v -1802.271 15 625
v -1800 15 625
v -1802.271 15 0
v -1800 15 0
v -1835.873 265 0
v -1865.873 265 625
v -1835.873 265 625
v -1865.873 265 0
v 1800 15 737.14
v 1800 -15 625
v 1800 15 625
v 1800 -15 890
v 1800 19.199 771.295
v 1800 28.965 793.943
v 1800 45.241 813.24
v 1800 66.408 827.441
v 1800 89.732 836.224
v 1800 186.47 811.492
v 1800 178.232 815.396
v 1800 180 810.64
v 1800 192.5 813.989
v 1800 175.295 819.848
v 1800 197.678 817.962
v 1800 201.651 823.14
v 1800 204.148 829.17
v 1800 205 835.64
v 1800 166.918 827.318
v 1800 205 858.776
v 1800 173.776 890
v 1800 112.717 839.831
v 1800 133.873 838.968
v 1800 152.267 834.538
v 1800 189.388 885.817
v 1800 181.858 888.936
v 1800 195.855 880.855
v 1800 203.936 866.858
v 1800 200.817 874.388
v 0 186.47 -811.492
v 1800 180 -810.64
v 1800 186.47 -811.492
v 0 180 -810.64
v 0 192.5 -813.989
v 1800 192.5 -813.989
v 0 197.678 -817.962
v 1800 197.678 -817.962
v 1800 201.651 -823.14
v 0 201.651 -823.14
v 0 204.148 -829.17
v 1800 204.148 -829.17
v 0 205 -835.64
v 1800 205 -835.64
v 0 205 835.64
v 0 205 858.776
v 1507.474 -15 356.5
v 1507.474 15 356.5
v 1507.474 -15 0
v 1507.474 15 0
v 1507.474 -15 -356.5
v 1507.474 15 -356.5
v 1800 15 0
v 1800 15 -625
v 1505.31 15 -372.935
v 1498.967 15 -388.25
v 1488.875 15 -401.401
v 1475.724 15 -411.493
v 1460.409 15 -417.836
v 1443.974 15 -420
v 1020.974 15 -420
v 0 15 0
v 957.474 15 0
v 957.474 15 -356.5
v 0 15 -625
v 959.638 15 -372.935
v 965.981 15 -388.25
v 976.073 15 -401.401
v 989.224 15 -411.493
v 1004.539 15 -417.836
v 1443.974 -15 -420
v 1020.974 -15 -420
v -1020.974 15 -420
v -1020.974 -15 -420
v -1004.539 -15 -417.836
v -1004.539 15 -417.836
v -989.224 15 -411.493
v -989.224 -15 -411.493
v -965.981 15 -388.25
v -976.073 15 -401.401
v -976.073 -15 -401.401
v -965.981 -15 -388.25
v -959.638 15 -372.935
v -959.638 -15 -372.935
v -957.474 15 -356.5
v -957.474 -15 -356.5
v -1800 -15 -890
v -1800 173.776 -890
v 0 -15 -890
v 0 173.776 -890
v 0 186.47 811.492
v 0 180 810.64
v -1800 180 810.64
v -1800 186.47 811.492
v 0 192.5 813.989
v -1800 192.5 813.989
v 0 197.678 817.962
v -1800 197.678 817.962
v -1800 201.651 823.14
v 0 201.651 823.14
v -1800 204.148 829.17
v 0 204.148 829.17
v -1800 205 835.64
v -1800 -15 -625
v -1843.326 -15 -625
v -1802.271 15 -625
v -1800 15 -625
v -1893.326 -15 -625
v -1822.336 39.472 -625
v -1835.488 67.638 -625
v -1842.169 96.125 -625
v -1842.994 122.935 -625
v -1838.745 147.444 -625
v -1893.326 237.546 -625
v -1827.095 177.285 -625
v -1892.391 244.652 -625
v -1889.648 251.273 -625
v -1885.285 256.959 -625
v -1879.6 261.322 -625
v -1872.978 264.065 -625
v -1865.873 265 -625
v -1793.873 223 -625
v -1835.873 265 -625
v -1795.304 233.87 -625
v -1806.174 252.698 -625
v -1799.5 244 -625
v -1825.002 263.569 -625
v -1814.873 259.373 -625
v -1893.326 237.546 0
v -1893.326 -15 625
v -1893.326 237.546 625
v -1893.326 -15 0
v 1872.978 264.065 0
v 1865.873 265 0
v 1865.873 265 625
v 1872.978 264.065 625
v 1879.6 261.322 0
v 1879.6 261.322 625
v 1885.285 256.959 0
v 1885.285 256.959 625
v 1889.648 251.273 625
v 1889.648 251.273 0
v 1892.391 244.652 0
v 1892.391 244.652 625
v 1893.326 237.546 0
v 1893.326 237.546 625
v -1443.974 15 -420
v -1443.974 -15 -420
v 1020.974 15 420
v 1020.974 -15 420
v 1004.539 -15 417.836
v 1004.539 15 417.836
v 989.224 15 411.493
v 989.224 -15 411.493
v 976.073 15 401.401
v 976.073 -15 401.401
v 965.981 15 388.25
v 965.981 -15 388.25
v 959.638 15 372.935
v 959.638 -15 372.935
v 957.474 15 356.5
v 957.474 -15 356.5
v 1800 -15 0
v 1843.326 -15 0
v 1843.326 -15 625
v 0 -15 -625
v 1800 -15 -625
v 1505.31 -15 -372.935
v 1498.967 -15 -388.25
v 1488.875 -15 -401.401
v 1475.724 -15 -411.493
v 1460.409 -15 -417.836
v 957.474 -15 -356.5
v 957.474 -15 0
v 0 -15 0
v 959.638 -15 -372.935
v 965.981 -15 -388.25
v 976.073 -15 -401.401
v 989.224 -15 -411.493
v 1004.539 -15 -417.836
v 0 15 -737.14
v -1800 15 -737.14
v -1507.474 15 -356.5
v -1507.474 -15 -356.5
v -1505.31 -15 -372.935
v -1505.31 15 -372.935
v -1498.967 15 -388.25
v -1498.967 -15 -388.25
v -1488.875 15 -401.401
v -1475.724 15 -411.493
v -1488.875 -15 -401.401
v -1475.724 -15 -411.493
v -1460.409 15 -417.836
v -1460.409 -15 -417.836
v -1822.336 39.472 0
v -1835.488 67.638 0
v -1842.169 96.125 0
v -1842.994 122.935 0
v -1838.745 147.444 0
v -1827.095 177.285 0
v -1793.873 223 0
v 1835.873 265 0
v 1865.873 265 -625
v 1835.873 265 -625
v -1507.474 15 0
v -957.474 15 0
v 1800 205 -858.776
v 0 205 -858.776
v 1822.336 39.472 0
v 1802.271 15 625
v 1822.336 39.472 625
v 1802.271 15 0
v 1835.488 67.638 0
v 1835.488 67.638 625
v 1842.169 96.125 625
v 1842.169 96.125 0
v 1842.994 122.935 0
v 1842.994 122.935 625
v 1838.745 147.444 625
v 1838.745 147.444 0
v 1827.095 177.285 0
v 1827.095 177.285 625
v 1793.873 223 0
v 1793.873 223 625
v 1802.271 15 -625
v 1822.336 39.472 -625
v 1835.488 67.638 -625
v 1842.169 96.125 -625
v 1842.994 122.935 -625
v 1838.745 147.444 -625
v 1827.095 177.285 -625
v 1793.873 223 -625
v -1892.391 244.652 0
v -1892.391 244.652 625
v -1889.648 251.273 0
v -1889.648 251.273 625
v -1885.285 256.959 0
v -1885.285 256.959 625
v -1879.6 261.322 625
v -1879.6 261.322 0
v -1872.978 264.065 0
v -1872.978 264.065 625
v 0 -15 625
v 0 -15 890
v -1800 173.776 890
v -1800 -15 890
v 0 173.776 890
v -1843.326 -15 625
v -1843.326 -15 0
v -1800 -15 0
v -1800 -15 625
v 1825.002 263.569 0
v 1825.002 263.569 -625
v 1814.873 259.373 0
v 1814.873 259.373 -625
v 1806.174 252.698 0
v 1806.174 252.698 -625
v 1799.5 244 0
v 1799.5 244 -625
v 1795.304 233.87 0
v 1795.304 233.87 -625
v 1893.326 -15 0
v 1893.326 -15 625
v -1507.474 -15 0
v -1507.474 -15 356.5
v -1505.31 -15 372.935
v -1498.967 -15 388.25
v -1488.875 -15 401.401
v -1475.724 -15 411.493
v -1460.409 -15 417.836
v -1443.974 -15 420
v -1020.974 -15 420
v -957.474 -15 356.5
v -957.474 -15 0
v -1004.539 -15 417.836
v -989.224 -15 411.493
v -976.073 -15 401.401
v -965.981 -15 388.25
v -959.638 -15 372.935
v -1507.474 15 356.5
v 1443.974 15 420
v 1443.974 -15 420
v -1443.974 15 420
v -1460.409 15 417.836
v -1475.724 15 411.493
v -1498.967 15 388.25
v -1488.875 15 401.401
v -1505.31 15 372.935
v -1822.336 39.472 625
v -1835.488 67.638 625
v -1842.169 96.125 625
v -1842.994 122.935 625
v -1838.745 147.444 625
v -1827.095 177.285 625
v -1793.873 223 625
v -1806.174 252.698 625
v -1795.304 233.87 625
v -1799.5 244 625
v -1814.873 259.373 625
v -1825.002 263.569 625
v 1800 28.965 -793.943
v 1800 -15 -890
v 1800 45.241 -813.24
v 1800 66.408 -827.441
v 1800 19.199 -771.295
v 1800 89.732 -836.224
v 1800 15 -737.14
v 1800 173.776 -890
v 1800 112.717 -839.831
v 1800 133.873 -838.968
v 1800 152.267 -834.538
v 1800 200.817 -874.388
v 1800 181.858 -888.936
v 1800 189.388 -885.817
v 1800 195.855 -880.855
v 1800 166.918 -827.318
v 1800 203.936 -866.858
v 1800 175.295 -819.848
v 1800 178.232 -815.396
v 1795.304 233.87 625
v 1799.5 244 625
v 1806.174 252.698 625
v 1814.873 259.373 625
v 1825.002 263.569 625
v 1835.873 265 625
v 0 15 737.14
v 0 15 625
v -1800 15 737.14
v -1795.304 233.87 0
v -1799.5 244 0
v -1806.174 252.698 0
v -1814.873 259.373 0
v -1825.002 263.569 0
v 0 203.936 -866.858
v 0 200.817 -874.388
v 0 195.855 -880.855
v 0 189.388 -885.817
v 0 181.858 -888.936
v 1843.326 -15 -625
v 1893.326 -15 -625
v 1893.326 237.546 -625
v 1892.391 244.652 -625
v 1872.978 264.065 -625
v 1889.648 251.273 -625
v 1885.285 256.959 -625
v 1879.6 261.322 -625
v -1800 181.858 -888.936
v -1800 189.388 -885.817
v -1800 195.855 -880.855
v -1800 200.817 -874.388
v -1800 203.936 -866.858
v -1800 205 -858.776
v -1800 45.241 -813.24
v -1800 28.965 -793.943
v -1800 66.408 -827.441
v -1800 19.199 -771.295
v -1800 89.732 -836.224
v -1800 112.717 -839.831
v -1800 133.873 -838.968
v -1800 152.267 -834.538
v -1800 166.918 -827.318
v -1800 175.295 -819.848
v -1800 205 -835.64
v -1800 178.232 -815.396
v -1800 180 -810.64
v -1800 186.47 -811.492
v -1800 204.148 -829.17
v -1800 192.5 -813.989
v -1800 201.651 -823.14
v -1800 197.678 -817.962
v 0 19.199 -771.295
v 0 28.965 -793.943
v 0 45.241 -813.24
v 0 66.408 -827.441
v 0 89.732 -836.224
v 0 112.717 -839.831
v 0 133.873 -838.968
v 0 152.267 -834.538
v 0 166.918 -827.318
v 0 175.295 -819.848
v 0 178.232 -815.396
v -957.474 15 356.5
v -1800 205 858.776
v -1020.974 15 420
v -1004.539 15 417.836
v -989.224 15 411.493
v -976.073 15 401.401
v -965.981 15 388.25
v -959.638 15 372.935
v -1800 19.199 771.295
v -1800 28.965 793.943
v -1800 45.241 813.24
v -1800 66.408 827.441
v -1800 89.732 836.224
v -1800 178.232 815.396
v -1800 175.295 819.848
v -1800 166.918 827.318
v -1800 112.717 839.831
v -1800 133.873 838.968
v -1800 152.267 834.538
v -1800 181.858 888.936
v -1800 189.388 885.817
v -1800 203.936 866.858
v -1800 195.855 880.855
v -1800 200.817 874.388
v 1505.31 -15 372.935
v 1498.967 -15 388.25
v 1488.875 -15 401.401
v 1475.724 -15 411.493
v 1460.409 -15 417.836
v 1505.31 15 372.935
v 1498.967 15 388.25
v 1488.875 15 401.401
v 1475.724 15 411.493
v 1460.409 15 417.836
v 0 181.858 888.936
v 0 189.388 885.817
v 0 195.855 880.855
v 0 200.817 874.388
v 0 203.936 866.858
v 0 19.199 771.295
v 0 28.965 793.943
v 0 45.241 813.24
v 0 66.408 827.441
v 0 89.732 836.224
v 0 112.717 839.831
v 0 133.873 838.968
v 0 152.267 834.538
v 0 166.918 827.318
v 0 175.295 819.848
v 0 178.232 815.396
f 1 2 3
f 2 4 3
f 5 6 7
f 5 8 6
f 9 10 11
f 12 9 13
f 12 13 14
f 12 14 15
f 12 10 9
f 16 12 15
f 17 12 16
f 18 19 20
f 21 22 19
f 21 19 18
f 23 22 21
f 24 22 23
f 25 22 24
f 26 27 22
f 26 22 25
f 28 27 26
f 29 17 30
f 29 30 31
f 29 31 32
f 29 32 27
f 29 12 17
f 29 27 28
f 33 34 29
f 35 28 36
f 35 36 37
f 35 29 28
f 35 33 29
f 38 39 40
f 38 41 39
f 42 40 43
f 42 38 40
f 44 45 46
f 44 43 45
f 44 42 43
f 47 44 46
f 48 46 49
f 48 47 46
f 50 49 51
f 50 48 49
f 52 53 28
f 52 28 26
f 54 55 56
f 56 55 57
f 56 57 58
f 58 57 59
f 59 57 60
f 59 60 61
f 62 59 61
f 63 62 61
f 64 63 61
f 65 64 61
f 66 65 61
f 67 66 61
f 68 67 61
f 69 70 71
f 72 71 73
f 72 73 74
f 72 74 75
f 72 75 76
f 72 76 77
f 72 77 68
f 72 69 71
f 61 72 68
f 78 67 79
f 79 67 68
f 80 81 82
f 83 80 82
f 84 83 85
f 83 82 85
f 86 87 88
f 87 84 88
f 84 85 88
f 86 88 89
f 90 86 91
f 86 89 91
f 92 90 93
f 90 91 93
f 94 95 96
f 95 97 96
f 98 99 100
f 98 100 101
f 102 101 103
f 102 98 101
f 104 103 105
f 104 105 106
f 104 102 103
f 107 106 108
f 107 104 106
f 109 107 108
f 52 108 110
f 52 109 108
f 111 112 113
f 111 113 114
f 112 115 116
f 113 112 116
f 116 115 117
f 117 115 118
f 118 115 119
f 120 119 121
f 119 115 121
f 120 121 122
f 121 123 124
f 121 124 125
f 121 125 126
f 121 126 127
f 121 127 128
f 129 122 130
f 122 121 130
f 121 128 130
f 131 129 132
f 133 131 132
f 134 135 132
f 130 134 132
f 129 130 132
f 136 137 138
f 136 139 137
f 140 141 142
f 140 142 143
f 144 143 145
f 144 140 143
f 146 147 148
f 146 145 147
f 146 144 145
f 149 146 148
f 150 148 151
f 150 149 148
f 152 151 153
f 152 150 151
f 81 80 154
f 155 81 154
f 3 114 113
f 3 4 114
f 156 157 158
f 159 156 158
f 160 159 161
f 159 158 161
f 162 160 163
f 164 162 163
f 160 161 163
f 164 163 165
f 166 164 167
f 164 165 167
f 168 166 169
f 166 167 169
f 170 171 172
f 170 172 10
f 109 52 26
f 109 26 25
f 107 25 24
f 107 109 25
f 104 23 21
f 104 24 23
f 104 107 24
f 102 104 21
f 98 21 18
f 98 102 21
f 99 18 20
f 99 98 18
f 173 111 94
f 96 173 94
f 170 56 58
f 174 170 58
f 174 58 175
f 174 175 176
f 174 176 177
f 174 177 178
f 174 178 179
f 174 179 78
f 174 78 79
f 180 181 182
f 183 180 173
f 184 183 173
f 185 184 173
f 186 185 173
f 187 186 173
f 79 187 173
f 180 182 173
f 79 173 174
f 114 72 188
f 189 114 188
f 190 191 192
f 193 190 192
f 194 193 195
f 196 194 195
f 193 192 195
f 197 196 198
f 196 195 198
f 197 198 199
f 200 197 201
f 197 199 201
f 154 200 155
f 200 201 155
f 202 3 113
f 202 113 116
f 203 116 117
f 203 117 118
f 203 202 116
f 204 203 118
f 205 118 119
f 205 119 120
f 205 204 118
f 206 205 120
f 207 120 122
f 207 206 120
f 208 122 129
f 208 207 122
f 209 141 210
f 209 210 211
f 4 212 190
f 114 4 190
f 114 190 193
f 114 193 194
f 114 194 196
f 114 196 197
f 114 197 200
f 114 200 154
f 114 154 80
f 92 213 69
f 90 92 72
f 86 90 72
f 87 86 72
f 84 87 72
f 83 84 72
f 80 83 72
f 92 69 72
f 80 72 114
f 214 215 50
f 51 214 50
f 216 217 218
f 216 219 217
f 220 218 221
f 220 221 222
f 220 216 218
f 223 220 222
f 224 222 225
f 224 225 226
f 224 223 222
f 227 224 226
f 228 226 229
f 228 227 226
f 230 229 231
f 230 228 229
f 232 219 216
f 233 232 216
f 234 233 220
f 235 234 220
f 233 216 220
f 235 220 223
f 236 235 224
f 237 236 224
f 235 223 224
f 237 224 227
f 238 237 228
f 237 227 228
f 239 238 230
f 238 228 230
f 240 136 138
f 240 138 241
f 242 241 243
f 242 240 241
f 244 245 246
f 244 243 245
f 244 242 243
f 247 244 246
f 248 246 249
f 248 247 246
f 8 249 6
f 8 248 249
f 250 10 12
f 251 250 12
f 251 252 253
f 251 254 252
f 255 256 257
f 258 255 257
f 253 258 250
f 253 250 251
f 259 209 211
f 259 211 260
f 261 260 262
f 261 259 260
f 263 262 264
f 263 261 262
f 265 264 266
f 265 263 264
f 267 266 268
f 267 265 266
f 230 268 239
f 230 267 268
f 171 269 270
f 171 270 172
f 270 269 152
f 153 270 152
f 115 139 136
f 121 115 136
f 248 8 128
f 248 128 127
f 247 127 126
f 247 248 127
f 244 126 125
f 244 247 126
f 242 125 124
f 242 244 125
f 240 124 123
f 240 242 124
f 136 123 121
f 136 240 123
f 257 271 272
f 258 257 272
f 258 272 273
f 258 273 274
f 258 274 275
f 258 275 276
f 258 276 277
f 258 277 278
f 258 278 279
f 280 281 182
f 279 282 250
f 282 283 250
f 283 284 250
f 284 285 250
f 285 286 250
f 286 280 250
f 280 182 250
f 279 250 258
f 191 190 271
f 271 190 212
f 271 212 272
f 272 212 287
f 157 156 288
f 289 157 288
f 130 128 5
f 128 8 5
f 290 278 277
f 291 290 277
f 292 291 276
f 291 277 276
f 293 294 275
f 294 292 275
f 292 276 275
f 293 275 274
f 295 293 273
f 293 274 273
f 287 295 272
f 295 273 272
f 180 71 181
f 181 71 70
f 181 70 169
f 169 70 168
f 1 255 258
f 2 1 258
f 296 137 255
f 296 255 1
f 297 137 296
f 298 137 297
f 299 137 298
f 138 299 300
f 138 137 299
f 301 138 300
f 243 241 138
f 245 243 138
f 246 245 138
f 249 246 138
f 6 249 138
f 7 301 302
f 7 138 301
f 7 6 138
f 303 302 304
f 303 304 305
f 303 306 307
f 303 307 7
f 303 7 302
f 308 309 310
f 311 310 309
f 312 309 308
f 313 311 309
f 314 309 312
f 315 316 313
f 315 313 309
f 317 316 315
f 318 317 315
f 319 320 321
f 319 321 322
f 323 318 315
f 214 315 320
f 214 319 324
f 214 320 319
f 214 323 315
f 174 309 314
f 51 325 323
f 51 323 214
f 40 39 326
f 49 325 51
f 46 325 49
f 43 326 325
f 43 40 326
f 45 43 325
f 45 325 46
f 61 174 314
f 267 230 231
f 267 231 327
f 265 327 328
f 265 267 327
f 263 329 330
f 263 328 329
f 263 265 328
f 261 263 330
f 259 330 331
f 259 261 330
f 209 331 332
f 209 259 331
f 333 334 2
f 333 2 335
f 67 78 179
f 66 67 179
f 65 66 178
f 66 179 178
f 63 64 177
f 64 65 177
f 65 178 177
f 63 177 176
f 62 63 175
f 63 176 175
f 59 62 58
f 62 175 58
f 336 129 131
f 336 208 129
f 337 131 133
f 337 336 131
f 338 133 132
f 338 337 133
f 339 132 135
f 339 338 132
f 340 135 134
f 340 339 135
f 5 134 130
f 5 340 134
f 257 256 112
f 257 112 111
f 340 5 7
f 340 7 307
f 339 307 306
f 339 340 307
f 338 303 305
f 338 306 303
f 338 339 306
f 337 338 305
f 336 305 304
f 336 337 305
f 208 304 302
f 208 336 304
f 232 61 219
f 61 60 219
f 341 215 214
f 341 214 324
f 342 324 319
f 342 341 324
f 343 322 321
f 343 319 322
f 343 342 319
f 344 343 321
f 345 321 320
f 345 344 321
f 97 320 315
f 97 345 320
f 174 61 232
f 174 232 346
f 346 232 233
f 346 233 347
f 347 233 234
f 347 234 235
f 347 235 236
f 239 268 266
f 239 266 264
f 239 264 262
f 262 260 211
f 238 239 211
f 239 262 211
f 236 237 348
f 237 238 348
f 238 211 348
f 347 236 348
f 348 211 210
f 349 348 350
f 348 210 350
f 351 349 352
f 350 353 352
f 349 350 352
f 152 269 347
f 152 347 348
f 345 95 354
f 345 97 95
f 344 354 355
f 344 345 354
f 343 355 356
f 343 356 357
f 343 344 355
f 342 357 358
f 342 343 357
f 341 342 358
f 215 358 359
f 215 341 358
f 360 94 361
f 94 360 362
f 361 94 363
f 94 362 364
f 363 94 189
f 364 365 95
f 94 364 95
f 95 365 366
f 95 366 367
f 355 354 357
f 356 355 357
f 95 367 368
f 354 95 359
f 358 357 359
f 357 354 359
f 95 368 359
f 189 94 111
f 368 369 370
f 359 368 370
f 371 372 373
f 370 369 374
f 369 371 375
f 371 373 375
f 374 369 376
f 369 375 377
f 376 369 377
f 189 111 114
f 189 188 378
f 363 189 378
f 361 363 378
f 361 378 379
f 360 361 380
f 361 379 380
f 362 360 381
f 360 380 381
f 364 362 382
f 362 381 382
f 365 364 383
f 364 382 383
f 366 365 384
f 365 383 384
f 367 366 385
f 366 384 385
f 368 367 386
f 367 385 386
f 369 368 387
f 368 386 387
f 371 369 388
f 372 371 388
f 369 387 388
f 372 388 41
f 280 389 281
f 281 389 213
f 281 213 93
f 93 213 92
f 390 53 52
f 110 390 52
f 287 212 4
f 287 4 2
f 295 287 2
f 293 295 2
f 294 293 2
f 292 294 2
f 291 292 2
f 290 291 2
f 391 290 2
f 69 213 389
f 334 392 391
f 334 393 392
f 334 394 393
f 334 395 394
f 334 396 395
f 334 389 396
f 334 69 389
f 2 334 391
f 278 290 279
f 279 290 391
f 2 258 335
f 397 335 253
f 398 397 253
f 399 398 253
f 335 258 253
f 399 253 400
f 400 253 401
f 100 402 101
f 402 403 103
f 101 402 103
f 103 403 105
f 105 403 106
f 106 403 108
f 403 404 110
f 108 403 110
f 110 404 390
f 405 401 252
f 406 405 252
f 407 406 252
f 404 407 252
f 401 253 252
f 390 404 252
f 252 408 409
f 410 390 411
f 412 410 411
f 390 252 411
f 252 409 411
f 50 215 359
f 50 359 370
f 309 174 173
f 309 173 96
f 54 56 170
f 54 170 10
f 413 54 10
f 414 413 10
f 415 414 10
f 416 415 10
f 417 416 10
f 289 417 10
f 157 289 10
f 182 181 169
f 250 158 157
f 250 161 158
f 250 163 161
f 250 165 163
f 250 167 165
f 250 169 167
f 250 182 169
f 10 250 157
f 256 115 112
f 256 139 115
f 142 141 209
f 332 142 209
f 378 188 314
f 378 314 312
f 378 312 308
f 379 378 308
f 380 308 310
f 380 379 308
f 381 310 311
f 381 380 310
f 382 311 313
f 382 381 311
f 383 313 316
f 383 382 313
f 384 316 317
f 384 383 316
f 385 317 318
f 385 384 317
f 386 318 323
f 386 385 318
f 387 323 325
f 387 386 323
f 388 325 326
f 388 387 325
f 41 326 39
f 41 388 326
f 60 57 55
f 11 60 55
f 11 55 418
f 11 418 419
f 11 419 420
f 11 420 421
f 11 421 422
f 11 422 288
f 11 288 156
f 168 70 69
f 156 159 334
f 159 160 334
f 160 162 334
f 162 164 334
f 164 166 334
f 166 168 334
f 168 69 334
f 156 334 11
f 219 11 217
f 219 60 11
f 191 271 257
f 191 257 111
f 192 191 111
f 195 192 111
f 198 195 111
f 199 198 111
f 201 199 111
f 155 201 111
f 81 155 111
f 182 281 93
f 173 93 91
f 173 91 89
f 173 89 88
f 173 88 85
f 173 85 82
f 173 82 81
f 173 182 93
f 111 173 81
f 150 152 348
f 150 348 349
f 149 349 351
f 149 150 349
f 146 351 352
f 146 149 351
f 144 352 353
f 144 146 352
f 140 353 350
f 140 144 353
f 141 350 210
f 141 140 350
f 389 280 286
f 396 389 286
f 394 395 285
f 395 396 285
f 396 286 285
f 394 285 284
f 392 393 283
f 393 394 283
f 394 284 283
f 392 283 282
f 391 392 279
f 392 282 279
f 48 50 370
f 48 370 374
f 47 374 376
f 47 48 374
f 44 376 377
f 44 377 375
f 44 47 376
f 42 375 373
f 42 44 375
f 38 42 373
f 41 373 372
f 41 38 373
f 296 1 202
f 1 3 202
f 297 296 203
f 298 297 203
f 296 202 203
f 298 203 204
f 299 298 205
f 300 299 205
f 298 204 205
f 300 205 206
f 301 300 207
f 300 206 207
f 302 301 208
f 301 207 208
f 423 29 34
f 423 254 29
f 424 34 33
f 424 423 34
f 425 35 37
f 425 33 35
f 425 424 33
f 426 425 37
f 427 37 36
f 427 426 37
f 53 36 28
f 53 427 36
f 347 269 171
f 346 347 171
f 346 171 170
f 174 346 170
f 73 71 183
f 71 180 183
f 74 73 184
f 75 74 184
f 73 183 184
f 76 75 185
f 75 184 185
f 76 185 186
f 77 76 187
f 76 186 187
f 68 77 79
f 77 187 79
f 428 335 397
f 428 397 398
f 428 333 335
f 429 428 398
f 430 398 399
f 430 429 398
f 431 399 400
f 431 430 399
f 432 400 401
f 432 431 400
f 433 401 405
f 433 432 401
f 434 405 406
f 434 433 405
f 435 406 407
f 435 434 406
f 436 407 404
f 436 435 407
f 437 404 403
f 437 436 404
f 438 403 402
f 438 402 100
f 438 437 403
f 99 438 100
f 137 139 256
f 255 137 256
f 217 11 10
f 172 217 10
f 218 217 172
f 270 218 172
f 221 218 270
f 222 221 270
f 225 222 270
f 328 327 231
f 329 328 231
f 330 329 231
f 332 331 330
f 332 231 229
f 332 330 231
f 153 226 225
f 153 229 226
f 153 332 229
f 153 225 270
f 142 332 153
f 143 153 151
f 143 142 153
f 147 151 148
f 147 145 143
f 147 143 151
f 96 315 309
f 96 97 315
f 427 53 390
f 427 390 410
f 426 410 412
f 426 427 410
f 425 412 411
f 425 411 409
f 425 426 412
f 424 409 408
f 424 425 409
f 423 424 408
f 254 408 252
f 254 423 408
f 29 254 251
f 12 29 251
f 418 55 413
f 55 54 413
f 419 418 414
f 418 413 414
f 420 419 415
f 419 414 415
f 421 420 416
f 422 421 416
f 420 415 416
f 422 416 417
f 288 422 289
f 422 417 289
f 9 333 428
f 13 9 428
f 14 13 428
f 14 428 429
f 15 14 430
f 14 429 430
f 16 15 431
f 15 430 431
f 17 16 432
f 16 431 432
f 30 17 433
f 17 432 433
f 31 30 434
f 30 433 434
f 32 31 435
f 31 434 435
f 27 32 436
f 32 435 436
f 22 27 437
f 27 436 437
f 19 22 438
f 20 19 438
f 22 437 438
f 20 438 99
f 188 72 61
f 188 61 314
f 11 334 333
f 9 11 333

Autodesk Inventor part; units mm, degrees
ref_plane "YZ Plane" through (0, 0, 0) normal (1, 0, 0) x (0, 1, 0)
ref_plane "XZ Plane" through (0, 0, 0) normal (0, 1, 0) x (-1, 0, 0)
ref_plane "XY Plane" through (0, 0, 0) normal (0, 0, 1) x (1, 0, 0)
sketch "Sketch1" plane through (0, 0, 0) normal (1, 0, 0) x (0, 1, 0)
  arc A0 (180, 810.64) -> (205, 835.64) centre (180, 835.64) ccw
  arc A1 (205, 858.7762) -> (173.7762, 890) centre (173.7762, 858.7762) ccw
  line L0 (0, 0) -> (30.28, 0) construction
  line L1 (205, 858.7762) -> (205, 835.64)
  line L2 (15, 0) -> (-15, 0) construction
  line L3 (-15, 0) -> (-15, 890)
  line L4 (15, 0) -> (15, 737.14)
  line L5 (0, 0) -> (0, 51.3695) construction
  line L6 (173.7762, 890) -> (-15, 890)
  line L7 (119.6029, 0) -> (249.4149, 0) construction
  spline S0 degree 4 poles (15, 737.14) (15, 762.8587) (22.661, 806.5882) (93.3132, 851.1722) (153.9624, 839.5046) (176.9487, 823.6651) (180, 810.64) knots 0 0 0 0 0 0.365063 0.584044 1 1 1 1 1
  line L8 (238.5148, 856.7698) -> (95.5367, 856.7698) construction
  line L9 (93.5, 837.14) -> (143.5, 837.14) construction
  line L10 (118.5, 837.14) -> (118.5, 840) construction
  line L11 (180, -810.64) -> (180, -810.64)
  arc A2 (205, -835.64) -> (180, -810.64) centre (180, -835.64) ccw
  arc A3 (173.7762, -890) -> (205, -858.7762) centre (173.7762, -858.7762) ccw
  line L12 (205, -858.7762) -> (205, -835.64)
  line L13 (-15, 0) -> (-15, -890)
  line L14 (15, 0) -> (15, -737.14)
  line L15 (173.7762, -890) -> (-15, -890)
  spline S1 degree 4 poles (15, -737.14) (15, -762.8587) (22.661, -806.5882) (93.3132, -851.1722) (153.9624, -839.5046) (176.9487, -823.6651) (180, -810.64) knots 0 0 0 0 0 0.365063 0.584044 1 1 1 1 1
  line L16 (180, 810.64) -> (162.5735, 810.64) construction
  point P0 (178.1248, 805.5246)
  point P1 (35.5, 803.14)
  point P2 (170.5, 824.64)
  point P3 (35.5, -803.14)
  point P4 (93.5, -837.14)
  point P5 (143.5, -837.14)
  point P6 (170.5, -824.64)
  point P7 (180, -810.64)
  dimension "d145" = 23.1363
  dimension "d151" = 30
  dimension "d161" = 165
  dimension "d324" = 9.5
  dimension "d325" = 27
  dimension "d326" = 50
  dimension "d327" = 58
  dimension "d328" = 66
  dimension "d329" = 34
  dimension "d330" = 14
  dimension "d331" = 12.5
  dimension "d332" = 840
  dimension "d333" = 50
  dimension "d349" = 90
  dimension "d350" = 220
sketch "Sketch2" plane through (0, 0, 0) normal (0, 0, 1) x (1, 0, 0)
  line L0 (-1802.2711, 15) -> (-1835.7711, 45) construction
  spline S0 degree 4 poles (-1802.2711, 15) (-1835.7711, 45) (-1854.7711, 115) (-1841.7711, 151) (-1817.7711, 196) (-1793.8727, 223) knots 1 1 1 1 1 1.747458 2 2 2 2 2
  line L1 (-1817.7711, 196) -> (-1793.8727, 223) construction
  line L2 (-1835.7711, 45) -> (-1854.7711, 115) construction
  line L3 (-1854.7711, 115) -> (-1841.7711, 151) construction
  line L4 (-1841.7711, 151) -> (-1817.7711, 196) construction
  line L5 (-1843.3264, 190.8381) -> (-1843.3264, 47.3152) construction
  line L6 (-1893.3264, -15) -> (-1893.3264, 237.5463)
  line L7 (0, 0) -> (20, 0) construction
  line L8 (0, 0) -> (0, 15) construction
  line L9 (0, 15) -> (-1802.2711, 15)
  line L10 (-1865.8727, 265) -> (-1835.8727, 265)
  arc A0 (-1865.8727, 265) -> (-1893.3264, 237.5463) centre (-1865.8727, 237.5463) ccw
  arc A1 (-1793.8727, 223) -> (-1835.8727, 265) centre (-1835.8727, 223) ccw
  line L11 (-1843.3264, -15) -> (0, -15)
  line L12 (-1893.3264, -15) -> (-1843.3264, -15)
  line L13 (1793.8727, 223) -> (1793.8727, 223)
  spline S1 degree 4 poles (1802.2711, 15) (1835.7711, 45) (1854.7711, 115) (1841.7711, 151) (1817.7711, 196) (1793.8727, 223) knots 1 1 1 1 1 1.747458 2 2 2 2 2
  line L14 (1802.2711, 15) -> (1835.7711, 45) construction
  line L15 (1835.7711, 45) -> (1854.7711, 115) construction
  line L16 (1854.7711, 115) -> (1841.7711, 151) construction
  line L17 (1841.7711, 151) -> (1817.7711, 196) construction
  line L18 (1817.7711, 196) -> (1793.8727, 223) construction
  line L19 (1893.3264, -15) -> (1893.3264, 237.5463)
  line L20 (0, 15) -> (1802.2711, 15)
  line L21 (1865.8727, 265) -> (1835.8727, 265)
  arc A2 (1893.3264, 237.5463) -> (1865.8727, 265) centre (1865.8727, 237.5463) ccw
  arc A3 (1835.8727, 265) -> (1793.8727, 223) centre (1835.8727, 223) ccw
  line L22 (1843.3264, -15) -> (0, -15)
  line L23 (1893.3264, -15) -> (1843.3264, -15)
  line L24 (-1836.4162, 120.7995) -> (1835.4407, 120.7995) construction
  line L25 (1835.4407, 215.7869) -> (1835.4407, 25.812) construction
  line L26 (1835.4407, 25.812) -> (-1836.4162, 25.812) construction
  line L27 (-1836.4162, 25.812) -> (-1836.4162, 215.7869) construction
  line L28 (-1836.4162, 215.7869) -> (1835.4407, 215.7869) construction
  line L29 (1843.3264, 207.1179) -> (1843.3264, 57.9131) construction
  point P0 (1793.8727, 223)
  point P1 (-1843.3264, 119.0766)
  dimension "d132" = 27
  dimension "d133" = 45
  dimension "d134" = 36
  dimension "d135" = 70
  dimension "d136" = 30
  dimension "d137" = 33.5
  dimension "d138" = 19
  dimension "d139" = 13
  dimension "d140" = 24
  dimension "d141" = 23.8984
  dimension "d169" = 30
  dimension "d174" = 250
  dimension "d176" = 1843.3264
  dimension "d177" = 30
  dimension "d178" = 50
  dimension "d179" = 20
  dimension "d336" = 90
  dimension "d345" = 3686.6529
extrude "Extrusion3" add sketch "Sketch1" against normal mid plane 3600
extrude "Extrusion4" add sketch "Sketch2" along normal mid plane 1250
sketch "Sketch4" plane through (-1789.2984, 15, 559.8188) normal (0, 1, 0) x (1, 0, 0)
  line L0 (3676.7725, 1250) -> (3676.7725, 0) projected
  line L1 (3296.7725, 979.8188) -> (2746.7725, 979.8188)
  line L2 (2746.7725, 979.8188) -> (2746.7725, 139.8188)
  line L3 (2746.7725, 139.8188) -> (3296.7725, 139.8188)
  line L4 (3296.7725, 139.8188) -> (3296.7725, 979.8188)
  line L5 (4439.9554, 559.8188) -> (-861.3586, 559.8188) projected
  line L6 (1789.2984, 1805.8188) -> (1789.2984, -686.1812) projected
  line L7 (831.8244, 979.8188) -> (281.8244, 979.8188)
  line L8 (281.8244, 979.8188) -> (281.8244, 139.8188)
  line L9 (281.8244, 139.8188) -> (831.8244, 139.8188)
  line L10 (831.8244, 139.8188) -> (831.8244, 979.8188)
  point P0 (1789.2984, 559.8188)
  dimension "d90" = 420
  dimension "d91" = 420
  dimension "d92" = 550
  dimension "d93" = 380
  dimension "d98" = 957.474
  dimension "d99" = 957.474
  dimension "d100" = 550
extrude "Extrusion5" cut sketch "Sketch4" against normal blind 1200
fillet "Fillet1" radius 63.5 8 edges at (1507.474, 0, 420) (957.474, 0, 420) (957.474, 0, -420) (1507.474, 0, -420) (-1507.474, 0, -420) (-957.474, 0, -420) (-1507.474, 0, 420) (-957.474, 0, 420)
sketch "Sketch11" plane through (-1800, 15, -725.6356) normal (0, 1, 0) x (1, 0, 0)
  point P0 (1800, -725.6356)
